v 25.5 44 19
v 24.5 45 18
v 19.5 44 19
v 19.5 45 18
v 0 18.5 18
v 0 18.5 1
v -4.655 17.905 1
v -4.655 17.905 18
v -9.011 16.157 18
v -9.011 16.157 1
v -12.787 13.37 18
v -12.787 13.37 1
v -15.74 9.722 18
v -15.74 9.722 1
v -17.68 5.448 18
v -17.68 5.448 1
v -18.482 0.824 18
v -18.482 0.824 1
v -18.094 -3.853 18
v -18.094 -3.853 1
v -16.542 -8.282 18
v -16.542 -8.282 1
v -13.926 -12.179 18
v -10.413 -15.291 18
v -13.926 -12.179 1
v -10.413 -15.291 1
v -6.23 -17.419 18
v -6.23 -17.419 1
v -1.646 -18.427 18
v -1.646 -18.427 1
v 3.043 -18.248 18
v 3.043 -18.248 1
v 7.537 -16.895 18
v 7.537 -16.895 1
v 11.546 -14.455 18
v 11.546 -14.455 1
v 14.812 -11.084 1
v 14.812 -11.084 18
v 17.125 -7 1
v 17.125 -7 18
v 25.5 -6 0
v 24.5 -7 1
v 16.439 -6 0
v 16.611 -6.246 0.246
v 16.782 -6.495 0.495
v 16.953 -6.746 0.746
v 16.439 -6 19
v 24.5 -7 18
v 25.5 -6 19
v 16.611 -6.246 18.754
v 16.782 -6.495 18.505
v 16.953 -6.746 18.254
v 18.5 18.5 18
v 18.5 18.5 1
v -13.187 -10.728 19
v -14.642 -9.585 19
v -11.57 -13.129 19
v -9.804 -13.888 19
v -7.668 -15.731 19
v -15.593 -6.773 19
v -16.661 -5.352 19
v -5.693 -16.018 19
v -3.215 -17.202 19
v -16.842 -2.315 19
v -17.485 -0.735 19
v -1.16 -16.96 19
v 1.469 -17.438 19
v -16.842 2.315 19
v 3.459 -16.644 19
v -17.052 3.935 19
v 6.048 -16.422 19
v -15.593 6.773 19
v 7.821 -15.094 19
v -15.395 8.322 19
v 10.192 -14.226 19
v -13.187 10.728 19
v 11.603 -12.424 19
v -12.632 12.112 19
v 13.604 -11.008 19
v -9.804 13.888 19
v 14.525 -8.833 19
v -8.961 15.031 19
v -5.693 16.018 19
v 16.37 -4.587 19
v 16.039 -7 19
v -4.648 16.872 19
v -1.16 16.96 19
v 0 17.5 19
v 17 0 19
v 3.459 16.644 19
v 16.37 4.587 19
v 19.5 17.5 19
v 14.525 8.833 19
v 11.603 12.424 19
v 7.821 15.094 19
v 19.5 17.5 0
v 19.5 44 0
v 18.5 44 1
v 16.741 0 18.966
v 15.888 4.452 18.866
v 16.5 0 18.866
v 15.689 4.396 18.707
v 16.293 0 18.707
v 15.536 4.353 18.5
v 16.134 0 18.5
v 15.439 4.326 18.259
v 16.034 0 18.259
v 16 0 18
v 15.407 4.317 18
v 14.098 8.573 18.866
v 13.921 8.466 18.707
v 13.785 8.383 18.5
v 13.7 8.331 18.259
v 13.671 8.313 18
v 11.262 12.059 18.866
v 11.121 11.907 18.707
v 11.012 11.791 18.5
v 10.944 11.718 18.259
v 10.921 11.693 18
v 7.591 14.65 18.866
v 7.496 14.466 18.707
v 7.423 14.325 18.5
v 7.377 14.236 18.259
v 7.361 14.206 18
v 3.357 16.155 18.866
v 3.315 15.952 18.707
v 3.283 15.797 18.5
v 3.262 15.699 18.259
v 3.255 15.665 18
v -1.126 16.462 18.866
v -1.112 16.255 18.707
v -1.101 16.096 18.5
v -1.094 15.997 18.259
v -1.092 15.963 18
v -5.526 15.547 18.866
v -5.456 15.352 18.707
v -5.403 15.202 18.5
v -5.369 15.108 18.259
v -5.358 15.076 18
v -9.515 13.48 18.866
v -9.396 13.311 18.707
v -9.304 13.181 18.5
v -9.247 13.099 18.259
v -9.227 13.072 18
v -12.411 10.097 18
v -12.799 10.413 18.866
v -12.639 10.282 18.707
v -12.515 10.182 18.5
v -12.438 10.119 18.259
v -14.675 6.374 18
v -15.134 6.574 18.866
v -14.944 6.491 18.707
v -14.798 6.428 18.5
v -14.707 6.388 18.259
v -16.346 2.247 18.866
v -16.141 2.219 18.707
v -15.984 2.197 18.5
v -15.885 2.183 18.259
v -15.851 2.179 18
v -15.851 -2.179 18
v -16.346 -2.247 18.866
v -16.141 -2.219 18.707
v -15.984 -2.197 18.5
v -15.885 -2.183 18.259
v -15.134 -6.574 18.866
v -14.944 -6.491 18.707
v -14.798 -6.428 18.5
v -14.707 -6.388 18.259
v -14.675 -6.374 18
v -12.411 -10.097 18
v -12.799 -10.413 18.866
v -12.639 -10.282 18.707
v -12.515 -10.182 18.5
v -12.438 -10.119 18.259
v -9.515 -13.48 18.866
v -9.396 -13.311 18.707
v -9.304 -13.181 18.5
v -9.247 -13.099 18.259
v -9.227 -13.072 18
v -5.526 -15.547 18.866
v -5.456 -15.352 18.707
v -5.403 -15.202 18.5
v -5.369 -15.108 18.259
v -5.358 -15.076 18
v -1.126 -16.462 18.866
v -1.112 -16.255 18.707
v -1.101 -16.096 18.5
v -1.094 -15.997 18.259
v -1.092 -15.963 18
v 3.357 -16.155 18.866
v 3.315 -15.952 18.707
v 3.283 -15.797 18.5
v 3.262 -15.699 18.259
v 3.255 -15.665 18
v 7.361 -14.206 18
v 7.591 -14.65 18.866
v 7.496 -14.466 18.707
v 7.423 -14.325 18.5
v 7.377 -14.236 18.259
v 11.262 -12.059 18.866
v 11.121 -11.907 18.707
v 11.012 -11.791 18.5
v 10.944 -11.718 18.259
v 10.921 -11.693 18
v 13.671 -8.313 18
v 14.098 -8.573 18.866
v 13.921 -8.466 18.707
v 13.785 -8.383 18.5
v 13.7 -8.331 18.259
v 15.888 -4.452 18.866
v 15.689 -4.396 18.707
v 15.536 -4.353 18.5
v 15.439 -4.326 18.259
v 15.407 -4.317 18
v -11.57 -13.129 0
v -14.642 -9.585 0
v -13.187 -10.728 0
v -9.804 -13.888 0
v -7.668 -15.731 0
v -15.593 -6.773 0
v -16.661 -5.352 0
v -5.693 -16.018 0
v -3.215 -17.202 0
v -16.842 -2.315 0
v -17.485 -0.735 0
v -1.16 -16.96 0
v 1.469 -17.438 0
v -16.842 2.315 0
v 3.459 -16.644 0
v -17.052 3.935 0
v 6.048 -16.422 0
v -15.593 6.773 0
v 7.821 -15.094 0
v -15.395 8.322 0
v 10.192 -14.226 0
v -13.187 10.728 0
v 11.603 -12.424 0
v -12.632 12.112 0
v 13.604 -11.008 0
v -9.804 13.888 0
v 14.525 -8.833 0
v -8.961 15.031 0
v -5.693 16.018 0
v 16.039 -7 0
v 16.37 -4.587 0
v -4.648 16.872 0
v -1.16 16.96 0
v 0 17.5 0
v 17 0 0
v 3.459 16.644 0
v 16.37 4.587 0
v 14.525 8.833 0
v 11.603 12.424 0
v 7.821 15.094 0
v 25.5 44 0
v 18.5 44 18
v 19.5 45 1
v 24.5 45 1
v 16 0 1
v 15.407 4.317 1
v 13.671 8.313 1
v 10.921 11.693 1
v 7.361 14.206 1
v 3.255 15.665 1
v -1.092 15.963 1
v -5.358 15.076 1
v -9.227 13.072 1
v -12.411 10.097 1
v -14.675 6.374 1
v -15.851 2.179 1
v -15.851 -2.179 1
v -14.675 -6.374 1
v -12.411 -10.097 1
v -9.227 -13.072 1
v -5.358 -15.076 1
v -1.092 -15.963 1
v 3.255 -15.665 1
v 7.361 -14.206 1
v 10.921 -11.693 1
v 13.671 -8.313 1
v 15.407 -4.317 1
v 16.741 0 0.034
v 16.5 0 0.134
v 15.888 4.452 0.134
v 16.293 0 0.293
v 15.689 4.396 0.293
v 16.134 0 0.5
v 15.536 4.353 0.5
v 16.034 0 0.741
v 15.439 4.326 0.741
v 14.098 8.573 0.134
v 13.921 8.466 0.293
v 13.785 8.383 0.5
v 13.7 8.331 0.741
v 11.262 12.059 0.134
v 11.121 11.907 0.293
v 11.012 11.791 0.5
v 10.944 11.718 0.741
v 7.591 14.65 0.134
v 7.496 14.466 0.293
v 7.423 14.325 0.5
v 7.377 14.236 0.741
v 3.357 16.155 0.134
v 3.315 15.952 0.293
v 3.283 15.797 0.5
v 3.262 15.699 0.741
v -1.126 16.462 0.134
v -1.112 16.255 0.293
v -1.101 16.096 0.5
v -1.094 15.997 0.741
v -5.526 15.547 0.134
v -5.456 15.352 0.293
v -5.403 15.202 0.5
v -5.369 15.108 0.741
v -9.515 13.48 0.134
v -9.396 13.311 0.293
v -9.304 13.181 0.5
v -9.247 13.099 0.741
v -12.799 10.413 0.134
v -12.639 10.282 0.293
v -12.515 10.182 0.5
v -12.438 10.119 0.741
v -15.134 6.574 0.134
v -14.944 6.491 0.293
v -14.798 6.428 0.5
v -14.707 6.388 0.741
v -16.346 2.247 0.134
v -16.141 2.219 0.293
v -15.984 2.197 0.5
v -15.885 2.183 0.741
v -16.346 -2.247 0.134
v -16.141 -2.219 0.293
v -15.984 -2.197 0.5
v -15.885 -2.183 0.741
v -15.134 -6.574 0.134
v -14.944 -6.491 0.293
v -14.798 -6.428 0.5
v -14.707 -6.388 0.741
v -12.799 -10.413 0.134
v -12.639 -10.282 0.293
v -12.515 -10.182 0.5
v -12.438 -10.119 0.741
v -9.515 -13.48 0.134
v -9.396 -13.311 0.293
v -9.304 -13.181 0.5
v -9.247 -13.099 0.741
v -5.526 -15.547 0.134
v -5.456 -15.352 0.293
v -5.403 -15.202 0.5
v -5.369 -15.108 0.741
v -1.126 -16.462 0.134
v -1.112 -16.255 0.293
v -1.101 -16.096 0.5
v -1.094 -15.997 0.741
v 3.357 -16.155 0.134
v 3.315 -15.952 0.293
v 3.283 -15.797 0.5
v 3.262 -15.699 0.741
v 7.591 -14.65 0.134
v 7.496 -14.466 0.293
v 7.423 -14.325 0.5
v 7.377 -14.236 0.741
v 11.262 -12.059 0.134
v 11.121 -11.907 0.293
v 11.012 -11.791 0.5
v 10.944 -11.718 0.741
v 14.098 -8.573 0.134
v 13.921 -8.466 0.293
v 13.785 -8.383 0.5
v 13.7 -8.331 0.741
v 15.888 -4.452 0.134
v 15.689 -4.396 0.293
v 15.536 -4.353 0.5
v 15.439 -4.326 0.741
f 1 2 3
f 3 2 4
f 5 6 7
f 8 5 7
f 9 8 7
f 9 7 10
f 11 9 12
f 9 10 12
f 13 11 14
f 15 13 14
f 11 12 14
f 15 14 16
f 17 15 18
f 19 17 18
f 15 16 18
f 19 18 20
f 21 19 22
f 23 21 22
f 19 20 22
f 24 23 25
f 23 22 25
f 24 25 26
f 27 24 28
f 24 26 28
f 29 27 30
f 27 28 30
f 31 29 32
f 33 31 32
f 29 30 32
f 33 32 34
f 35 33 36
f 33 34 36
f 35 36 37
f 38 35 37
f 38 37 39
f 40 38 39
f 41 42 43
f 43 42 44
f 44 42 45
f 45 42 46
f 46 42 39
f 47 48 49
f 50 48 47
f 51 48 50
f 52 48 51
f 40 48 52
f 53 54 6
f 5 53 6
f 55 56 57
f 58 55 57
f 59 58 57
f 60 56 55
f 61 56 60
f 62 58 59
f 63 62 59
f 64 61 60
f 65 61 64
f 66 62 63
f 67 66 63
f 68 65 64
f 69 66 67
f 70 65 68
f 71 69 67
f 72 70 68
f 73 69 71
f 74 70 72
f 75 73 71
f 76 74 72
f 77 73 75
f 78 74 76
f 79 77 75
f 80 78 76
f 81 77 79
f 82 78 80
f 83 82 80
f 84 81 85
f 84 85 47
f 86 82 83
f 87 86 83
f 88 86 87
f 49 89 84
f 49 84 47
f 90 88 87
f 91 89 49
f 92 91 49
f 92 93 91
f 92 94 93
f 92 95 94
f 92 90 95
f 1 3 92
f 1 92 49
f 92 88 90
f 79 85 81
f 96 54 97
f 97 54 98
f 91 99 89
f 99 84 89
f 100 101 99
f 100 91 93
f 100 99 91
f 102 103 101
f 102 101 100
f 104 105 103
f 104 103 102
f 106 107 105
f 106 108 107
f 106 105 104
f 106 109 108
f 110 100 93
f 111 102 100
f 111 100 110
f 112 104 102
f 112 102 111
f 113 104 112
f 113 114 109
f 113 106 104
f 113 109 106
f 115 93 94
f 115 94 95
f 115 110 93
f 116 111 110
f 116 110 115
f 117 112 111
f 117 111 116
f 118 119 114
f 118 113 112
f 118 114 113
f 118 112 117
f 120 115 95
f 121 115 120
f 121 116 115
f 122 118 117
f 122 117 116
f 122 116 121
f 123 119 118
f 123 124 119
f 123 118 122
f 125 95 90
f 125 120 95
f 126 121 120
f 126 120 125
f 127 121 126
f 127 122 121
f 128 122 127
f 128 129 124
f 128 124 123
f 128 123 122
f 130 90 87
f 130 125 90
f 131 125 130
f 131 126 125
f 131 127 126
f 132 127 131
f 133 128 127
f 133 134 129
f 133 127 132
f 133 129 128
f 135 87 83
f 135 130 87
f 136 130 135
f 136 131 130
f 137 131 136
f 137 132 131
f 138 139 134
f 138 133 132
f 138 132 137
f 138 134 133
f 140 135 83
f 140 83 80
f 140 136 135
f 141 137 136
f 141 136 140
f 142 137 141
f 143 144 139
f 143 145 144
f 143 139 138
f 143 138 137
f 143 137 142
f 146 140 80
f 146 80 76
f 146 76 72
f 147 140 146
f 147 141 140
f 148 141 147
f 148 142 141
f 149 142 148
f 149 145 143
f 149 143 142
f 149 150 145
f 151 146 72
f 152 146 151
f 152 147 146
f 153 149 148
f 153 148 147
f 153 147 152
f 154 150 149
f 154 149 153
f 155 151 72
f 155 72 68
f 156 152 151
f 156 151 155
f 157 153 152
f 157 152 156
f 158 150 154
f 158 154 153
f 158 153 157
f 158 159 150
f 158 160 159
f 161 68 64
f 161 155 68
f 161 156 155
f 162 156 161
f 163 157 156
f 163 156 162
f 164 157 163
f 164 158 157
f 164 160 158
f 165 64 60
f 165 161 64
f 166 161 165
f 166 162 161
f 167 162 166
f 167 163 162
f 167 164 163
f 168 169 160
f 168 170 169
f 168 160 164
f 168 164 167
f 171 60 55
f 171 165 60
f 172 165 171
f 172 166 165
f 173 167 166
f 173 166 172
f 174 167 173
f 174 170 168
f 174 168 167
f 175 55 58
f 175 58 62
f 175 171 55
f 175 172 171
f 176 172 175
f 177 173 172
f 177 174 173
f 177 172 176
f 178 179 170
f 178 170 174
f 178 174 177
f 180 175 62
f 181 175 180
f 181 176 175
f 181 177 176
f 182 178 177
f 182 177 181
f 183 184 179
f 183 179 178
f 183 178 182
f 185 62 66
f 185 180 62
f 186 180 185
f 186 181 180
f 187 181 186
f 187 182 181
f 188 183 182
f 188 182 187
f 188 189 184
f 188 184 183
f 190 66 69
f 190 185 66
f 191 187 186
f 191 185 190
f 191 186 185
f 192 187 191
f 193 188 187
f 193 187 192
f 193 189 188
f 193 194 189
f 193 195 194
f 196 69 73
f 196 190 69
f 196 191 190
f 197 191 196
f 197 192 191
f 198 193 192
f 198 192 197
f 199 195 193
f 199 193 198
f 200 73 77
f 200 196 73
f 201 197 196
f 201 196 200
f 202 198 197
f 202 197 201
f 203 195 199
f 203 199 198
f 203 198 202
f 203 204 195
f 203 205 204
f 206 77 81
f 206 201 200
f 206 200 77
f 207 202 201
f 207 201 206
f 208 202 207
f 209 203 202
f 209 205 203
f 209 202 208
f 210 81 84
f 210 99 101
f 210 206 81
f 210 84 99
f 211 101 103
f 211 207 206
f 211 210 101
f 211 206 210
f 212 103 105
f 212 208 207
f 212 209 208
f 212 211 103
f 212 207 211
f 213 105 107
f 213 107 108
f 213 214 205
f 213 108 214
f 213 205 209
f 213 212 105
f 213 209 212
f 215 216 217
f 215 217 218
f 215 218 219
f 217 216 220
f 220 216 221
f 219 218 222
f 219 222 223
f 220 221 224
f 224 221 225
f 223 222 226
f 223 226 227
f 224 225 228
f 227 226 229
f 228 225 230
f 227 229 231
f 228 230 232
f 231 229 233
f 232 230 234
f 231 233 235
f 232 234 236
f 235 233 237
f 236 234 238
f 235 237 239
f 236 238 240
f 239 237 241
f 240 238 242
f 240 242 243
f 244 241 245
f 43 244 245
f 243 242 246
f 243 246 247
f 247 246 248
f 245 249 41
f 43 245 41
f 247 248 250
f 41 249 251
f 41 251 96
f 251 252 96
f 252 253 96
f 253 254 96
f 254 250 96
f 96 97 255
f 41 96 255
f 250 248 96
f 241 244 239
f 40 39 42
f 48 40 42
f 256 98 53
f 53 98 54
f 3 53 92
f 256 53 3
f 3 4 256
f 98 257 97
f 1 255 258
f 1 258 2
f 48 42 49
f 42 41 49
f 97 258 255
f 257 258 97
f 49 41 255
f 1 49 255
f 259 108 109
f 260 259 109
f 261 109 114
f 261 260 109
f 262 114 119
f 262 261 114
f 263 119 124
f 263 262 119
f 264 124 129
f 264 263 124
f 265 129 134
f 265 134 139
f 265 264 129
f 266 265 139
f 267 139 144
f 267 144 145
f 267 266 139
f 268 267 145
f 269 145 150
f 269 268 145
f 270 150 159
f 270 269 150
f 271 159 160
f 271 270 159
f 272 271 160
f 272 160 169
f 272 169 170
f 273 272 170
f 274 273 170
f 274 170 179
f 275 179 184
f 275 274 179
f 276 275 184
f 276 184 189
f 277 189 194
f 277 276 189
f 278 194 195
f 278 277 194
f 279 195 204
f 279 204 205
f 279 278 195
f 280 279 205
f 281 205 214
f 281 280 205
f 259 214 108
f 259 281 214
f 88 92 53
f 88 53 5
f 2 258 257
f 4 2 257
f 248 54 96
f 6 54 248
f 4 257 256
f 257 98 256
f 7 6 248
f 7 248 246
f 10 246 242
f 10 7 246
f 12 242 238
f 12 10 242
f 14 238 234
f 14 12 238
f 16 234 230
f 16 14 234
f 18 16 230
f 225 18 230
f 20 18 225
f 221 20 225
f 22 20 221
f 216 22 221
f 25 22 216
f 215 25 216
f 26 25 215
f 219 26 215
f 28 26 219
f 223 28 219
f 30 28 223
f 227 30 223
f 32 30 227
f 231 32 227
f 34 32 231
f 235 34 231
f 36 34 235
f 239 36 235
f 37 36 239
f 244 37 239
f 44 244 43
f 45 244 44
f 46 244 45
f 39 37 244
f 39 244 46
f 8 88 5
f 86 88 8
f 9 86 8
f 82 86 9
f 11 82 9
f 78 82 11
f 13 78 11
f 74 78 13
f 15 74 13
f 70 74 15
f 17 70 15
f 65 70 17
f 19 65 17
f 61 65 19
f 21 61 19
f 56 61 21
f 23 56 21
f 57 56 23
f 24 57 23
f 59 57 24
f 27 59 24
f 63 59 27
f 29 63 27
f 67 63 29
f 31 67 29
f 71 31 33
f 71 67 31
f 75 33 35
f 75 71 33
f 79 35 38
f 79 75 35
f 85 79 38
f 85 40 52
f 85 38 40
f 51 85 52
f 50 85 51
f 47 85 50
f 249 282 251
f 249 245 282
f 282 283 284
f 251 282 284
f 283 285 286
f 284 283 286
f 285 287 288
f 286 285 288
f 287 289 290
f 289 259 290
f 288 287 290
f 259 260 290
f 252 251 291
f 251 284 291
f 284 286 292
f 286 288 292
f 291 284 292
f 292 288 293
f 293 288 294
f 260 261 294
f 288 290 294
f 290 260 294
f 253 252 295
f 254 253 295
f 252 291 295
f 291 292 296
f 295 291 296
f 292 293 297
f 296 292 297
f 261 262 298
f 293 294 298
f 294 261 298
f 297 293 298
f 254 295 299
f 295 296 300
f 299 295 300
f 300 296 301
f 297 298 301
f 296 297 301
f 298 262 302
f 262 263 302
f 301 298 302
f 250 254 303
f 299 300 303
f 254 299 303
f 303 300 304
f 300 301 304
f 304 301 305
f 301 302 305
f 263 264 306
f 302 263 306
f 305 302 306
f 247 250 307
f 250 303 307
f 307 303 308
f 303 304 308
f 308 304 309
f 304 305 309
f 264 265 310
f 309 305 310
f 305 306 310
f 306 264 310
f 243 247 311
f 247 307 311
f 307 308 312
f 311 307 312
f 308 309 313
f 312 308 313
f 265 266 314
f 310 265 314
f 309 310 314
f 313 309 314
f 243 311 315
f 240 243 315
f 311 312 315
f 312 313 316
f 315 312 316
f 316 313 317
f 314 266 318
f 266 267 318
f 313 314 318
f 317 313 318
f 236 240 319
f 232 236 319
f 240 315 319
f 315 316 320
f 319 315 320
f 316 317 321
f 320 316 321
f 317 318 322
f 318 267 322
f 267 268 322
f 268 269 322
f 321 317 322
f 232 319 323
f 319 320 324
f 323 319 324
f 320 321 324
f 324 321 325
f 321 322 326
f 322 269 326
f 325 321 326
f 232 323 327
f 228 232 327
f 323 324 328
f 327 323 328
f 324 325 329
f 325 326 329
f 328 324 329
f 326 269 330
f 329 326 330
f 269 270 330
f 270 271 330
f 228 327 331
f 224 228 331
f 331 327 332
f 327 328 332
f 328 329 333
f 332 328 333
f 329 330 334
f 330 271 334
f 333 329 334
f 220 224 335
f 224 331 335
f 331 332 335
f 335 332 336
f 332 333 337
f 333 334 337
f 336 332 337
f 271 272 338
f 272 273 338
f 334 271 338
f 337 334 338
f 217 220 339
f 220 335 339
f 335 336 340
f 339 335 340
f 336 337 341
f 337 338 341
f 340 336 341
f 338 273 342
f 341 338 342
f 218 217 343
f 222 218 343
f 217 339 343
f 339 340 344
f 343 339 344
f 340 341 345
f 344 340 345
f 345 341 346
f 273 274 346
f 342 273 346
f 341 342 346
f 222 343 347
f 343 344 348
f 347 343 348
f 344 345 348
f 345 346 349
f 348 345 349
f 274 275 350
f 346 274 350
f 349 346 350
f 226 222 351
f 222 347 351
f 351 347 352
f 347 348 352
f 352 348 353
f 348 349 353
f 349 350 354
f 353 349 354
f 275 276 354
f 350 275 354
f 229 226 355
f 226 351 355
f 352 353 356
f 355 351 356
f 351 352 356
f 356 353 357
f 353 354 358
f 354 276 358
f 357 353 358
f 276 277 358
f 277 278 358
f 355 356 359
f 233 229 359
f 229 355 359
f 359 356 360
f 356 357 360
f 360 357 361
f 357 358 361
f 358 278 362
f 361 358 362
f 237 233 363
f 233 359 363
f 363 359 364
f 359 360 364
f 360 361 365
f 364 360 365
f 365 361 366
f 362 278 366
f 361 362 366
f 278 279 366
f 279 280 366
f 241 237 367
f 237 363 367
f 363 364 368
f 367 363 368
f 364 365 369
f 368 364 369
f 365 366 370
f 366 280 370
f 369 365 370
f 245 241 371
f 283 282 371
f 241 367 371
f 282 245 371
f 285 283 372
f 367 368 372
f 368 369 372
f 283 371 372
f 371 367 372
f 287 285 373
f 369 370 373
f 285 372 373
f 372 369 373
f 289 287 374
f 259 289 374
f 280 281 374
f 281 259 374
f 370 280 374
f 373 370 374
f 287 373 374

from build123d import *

# Parameters (mm, degrees)
F1_R     = 16
F1_W     = 7
F1_H     = 7
F2_DEPTH = 19
F3_SIZE  = 1
F4_R     = 1
F5_SIZE  = 1
F6_SIZE  = 1


with BuildPart() as f2:
    # F1 (on Top) → F2 (new body)
    with BuildSketch(Plane.XY):
        with BuildLine():
            ThreePointArc((17.1245437895, -7), (18.1528793874, -3.5669272416), (18.5, 0))
            ThreePointArc((18.5, 0), (13.081475452, 13.081475452), (0, 18.5))
            ThreePointArc((0, 18.5), (-15.3582225534, -10.3138256724), (17.1245437895, -7))
        make_face()
        Circle(F1_R, mode=Mode.SUBTRACT)
        with BuildLine():
            ThreePointArc((0, 18.5), (13.081475452, 13.081475452), (18.5, 0))
            Line((18.5, 0), (18.5, 18.5))
            Line((18.5, 18.5), (0, 18.5))
        make_face()
        Polygon((18.5, 18.5), (18.5, 0), (25.5, 0), (25.5, 45), (18.5, 45), align=None)
        with BuildLine():
            Line((18.5, -7), (18.5, 0))
            ThreePointArc((18.5, 0), (18.1528793874, -3.5669272416), (17.1245437895, -7))
            Line((17.1245437895, -7), (18.5, -7))
        make_face()
        with Locations((22, -3.5)):
            Rectangle(F1_W, F1_H)
    extrude(amount=F2_DEPTH)

    # F3
    f3_edges = [f2.edges().sort_by_distance(p)[0] for p in [
        (25.5, -7, 9.5),
    ]]
    chamfer(f3_edges, length=F3_SIZE)

    # F4
    f4_edges = [f2.edges().sort_by_distance(p)[0] for p in [
        (-16, 0, 19),
        (-16, 0, 0),
    ]]
    fillet(f4_edges, radius=F4_R)

    # F5
    f5_edges = [f2.edges().sort_by_distance(p)[0] for p in [
        (9.25, 18.5, 19),
        (-15.358223, -10.313826, 19),
        (-15.358223, -10.313826, 0),
        (9.25, 18.5, 0),
    ]]
    chamfer(f5_edges, length=F5_SIZE)

    # F6
    f6_edges = [f2.edges().sort_by_distance(p)[0] for p in [
        (18.5, 45, 9.5),
        (22, 45, 0),
        (22, 45, 19),
        (25.5, 45, 9.5),
        (18.5, 31.75, 19),
        (18.5, 31.75, 0),
        (20.812272, -7, 19),
        (20.812272, -7, 0),
    ]]
    chamfer(f6_edges, length=F6_SIZE)


solid = f2.part
